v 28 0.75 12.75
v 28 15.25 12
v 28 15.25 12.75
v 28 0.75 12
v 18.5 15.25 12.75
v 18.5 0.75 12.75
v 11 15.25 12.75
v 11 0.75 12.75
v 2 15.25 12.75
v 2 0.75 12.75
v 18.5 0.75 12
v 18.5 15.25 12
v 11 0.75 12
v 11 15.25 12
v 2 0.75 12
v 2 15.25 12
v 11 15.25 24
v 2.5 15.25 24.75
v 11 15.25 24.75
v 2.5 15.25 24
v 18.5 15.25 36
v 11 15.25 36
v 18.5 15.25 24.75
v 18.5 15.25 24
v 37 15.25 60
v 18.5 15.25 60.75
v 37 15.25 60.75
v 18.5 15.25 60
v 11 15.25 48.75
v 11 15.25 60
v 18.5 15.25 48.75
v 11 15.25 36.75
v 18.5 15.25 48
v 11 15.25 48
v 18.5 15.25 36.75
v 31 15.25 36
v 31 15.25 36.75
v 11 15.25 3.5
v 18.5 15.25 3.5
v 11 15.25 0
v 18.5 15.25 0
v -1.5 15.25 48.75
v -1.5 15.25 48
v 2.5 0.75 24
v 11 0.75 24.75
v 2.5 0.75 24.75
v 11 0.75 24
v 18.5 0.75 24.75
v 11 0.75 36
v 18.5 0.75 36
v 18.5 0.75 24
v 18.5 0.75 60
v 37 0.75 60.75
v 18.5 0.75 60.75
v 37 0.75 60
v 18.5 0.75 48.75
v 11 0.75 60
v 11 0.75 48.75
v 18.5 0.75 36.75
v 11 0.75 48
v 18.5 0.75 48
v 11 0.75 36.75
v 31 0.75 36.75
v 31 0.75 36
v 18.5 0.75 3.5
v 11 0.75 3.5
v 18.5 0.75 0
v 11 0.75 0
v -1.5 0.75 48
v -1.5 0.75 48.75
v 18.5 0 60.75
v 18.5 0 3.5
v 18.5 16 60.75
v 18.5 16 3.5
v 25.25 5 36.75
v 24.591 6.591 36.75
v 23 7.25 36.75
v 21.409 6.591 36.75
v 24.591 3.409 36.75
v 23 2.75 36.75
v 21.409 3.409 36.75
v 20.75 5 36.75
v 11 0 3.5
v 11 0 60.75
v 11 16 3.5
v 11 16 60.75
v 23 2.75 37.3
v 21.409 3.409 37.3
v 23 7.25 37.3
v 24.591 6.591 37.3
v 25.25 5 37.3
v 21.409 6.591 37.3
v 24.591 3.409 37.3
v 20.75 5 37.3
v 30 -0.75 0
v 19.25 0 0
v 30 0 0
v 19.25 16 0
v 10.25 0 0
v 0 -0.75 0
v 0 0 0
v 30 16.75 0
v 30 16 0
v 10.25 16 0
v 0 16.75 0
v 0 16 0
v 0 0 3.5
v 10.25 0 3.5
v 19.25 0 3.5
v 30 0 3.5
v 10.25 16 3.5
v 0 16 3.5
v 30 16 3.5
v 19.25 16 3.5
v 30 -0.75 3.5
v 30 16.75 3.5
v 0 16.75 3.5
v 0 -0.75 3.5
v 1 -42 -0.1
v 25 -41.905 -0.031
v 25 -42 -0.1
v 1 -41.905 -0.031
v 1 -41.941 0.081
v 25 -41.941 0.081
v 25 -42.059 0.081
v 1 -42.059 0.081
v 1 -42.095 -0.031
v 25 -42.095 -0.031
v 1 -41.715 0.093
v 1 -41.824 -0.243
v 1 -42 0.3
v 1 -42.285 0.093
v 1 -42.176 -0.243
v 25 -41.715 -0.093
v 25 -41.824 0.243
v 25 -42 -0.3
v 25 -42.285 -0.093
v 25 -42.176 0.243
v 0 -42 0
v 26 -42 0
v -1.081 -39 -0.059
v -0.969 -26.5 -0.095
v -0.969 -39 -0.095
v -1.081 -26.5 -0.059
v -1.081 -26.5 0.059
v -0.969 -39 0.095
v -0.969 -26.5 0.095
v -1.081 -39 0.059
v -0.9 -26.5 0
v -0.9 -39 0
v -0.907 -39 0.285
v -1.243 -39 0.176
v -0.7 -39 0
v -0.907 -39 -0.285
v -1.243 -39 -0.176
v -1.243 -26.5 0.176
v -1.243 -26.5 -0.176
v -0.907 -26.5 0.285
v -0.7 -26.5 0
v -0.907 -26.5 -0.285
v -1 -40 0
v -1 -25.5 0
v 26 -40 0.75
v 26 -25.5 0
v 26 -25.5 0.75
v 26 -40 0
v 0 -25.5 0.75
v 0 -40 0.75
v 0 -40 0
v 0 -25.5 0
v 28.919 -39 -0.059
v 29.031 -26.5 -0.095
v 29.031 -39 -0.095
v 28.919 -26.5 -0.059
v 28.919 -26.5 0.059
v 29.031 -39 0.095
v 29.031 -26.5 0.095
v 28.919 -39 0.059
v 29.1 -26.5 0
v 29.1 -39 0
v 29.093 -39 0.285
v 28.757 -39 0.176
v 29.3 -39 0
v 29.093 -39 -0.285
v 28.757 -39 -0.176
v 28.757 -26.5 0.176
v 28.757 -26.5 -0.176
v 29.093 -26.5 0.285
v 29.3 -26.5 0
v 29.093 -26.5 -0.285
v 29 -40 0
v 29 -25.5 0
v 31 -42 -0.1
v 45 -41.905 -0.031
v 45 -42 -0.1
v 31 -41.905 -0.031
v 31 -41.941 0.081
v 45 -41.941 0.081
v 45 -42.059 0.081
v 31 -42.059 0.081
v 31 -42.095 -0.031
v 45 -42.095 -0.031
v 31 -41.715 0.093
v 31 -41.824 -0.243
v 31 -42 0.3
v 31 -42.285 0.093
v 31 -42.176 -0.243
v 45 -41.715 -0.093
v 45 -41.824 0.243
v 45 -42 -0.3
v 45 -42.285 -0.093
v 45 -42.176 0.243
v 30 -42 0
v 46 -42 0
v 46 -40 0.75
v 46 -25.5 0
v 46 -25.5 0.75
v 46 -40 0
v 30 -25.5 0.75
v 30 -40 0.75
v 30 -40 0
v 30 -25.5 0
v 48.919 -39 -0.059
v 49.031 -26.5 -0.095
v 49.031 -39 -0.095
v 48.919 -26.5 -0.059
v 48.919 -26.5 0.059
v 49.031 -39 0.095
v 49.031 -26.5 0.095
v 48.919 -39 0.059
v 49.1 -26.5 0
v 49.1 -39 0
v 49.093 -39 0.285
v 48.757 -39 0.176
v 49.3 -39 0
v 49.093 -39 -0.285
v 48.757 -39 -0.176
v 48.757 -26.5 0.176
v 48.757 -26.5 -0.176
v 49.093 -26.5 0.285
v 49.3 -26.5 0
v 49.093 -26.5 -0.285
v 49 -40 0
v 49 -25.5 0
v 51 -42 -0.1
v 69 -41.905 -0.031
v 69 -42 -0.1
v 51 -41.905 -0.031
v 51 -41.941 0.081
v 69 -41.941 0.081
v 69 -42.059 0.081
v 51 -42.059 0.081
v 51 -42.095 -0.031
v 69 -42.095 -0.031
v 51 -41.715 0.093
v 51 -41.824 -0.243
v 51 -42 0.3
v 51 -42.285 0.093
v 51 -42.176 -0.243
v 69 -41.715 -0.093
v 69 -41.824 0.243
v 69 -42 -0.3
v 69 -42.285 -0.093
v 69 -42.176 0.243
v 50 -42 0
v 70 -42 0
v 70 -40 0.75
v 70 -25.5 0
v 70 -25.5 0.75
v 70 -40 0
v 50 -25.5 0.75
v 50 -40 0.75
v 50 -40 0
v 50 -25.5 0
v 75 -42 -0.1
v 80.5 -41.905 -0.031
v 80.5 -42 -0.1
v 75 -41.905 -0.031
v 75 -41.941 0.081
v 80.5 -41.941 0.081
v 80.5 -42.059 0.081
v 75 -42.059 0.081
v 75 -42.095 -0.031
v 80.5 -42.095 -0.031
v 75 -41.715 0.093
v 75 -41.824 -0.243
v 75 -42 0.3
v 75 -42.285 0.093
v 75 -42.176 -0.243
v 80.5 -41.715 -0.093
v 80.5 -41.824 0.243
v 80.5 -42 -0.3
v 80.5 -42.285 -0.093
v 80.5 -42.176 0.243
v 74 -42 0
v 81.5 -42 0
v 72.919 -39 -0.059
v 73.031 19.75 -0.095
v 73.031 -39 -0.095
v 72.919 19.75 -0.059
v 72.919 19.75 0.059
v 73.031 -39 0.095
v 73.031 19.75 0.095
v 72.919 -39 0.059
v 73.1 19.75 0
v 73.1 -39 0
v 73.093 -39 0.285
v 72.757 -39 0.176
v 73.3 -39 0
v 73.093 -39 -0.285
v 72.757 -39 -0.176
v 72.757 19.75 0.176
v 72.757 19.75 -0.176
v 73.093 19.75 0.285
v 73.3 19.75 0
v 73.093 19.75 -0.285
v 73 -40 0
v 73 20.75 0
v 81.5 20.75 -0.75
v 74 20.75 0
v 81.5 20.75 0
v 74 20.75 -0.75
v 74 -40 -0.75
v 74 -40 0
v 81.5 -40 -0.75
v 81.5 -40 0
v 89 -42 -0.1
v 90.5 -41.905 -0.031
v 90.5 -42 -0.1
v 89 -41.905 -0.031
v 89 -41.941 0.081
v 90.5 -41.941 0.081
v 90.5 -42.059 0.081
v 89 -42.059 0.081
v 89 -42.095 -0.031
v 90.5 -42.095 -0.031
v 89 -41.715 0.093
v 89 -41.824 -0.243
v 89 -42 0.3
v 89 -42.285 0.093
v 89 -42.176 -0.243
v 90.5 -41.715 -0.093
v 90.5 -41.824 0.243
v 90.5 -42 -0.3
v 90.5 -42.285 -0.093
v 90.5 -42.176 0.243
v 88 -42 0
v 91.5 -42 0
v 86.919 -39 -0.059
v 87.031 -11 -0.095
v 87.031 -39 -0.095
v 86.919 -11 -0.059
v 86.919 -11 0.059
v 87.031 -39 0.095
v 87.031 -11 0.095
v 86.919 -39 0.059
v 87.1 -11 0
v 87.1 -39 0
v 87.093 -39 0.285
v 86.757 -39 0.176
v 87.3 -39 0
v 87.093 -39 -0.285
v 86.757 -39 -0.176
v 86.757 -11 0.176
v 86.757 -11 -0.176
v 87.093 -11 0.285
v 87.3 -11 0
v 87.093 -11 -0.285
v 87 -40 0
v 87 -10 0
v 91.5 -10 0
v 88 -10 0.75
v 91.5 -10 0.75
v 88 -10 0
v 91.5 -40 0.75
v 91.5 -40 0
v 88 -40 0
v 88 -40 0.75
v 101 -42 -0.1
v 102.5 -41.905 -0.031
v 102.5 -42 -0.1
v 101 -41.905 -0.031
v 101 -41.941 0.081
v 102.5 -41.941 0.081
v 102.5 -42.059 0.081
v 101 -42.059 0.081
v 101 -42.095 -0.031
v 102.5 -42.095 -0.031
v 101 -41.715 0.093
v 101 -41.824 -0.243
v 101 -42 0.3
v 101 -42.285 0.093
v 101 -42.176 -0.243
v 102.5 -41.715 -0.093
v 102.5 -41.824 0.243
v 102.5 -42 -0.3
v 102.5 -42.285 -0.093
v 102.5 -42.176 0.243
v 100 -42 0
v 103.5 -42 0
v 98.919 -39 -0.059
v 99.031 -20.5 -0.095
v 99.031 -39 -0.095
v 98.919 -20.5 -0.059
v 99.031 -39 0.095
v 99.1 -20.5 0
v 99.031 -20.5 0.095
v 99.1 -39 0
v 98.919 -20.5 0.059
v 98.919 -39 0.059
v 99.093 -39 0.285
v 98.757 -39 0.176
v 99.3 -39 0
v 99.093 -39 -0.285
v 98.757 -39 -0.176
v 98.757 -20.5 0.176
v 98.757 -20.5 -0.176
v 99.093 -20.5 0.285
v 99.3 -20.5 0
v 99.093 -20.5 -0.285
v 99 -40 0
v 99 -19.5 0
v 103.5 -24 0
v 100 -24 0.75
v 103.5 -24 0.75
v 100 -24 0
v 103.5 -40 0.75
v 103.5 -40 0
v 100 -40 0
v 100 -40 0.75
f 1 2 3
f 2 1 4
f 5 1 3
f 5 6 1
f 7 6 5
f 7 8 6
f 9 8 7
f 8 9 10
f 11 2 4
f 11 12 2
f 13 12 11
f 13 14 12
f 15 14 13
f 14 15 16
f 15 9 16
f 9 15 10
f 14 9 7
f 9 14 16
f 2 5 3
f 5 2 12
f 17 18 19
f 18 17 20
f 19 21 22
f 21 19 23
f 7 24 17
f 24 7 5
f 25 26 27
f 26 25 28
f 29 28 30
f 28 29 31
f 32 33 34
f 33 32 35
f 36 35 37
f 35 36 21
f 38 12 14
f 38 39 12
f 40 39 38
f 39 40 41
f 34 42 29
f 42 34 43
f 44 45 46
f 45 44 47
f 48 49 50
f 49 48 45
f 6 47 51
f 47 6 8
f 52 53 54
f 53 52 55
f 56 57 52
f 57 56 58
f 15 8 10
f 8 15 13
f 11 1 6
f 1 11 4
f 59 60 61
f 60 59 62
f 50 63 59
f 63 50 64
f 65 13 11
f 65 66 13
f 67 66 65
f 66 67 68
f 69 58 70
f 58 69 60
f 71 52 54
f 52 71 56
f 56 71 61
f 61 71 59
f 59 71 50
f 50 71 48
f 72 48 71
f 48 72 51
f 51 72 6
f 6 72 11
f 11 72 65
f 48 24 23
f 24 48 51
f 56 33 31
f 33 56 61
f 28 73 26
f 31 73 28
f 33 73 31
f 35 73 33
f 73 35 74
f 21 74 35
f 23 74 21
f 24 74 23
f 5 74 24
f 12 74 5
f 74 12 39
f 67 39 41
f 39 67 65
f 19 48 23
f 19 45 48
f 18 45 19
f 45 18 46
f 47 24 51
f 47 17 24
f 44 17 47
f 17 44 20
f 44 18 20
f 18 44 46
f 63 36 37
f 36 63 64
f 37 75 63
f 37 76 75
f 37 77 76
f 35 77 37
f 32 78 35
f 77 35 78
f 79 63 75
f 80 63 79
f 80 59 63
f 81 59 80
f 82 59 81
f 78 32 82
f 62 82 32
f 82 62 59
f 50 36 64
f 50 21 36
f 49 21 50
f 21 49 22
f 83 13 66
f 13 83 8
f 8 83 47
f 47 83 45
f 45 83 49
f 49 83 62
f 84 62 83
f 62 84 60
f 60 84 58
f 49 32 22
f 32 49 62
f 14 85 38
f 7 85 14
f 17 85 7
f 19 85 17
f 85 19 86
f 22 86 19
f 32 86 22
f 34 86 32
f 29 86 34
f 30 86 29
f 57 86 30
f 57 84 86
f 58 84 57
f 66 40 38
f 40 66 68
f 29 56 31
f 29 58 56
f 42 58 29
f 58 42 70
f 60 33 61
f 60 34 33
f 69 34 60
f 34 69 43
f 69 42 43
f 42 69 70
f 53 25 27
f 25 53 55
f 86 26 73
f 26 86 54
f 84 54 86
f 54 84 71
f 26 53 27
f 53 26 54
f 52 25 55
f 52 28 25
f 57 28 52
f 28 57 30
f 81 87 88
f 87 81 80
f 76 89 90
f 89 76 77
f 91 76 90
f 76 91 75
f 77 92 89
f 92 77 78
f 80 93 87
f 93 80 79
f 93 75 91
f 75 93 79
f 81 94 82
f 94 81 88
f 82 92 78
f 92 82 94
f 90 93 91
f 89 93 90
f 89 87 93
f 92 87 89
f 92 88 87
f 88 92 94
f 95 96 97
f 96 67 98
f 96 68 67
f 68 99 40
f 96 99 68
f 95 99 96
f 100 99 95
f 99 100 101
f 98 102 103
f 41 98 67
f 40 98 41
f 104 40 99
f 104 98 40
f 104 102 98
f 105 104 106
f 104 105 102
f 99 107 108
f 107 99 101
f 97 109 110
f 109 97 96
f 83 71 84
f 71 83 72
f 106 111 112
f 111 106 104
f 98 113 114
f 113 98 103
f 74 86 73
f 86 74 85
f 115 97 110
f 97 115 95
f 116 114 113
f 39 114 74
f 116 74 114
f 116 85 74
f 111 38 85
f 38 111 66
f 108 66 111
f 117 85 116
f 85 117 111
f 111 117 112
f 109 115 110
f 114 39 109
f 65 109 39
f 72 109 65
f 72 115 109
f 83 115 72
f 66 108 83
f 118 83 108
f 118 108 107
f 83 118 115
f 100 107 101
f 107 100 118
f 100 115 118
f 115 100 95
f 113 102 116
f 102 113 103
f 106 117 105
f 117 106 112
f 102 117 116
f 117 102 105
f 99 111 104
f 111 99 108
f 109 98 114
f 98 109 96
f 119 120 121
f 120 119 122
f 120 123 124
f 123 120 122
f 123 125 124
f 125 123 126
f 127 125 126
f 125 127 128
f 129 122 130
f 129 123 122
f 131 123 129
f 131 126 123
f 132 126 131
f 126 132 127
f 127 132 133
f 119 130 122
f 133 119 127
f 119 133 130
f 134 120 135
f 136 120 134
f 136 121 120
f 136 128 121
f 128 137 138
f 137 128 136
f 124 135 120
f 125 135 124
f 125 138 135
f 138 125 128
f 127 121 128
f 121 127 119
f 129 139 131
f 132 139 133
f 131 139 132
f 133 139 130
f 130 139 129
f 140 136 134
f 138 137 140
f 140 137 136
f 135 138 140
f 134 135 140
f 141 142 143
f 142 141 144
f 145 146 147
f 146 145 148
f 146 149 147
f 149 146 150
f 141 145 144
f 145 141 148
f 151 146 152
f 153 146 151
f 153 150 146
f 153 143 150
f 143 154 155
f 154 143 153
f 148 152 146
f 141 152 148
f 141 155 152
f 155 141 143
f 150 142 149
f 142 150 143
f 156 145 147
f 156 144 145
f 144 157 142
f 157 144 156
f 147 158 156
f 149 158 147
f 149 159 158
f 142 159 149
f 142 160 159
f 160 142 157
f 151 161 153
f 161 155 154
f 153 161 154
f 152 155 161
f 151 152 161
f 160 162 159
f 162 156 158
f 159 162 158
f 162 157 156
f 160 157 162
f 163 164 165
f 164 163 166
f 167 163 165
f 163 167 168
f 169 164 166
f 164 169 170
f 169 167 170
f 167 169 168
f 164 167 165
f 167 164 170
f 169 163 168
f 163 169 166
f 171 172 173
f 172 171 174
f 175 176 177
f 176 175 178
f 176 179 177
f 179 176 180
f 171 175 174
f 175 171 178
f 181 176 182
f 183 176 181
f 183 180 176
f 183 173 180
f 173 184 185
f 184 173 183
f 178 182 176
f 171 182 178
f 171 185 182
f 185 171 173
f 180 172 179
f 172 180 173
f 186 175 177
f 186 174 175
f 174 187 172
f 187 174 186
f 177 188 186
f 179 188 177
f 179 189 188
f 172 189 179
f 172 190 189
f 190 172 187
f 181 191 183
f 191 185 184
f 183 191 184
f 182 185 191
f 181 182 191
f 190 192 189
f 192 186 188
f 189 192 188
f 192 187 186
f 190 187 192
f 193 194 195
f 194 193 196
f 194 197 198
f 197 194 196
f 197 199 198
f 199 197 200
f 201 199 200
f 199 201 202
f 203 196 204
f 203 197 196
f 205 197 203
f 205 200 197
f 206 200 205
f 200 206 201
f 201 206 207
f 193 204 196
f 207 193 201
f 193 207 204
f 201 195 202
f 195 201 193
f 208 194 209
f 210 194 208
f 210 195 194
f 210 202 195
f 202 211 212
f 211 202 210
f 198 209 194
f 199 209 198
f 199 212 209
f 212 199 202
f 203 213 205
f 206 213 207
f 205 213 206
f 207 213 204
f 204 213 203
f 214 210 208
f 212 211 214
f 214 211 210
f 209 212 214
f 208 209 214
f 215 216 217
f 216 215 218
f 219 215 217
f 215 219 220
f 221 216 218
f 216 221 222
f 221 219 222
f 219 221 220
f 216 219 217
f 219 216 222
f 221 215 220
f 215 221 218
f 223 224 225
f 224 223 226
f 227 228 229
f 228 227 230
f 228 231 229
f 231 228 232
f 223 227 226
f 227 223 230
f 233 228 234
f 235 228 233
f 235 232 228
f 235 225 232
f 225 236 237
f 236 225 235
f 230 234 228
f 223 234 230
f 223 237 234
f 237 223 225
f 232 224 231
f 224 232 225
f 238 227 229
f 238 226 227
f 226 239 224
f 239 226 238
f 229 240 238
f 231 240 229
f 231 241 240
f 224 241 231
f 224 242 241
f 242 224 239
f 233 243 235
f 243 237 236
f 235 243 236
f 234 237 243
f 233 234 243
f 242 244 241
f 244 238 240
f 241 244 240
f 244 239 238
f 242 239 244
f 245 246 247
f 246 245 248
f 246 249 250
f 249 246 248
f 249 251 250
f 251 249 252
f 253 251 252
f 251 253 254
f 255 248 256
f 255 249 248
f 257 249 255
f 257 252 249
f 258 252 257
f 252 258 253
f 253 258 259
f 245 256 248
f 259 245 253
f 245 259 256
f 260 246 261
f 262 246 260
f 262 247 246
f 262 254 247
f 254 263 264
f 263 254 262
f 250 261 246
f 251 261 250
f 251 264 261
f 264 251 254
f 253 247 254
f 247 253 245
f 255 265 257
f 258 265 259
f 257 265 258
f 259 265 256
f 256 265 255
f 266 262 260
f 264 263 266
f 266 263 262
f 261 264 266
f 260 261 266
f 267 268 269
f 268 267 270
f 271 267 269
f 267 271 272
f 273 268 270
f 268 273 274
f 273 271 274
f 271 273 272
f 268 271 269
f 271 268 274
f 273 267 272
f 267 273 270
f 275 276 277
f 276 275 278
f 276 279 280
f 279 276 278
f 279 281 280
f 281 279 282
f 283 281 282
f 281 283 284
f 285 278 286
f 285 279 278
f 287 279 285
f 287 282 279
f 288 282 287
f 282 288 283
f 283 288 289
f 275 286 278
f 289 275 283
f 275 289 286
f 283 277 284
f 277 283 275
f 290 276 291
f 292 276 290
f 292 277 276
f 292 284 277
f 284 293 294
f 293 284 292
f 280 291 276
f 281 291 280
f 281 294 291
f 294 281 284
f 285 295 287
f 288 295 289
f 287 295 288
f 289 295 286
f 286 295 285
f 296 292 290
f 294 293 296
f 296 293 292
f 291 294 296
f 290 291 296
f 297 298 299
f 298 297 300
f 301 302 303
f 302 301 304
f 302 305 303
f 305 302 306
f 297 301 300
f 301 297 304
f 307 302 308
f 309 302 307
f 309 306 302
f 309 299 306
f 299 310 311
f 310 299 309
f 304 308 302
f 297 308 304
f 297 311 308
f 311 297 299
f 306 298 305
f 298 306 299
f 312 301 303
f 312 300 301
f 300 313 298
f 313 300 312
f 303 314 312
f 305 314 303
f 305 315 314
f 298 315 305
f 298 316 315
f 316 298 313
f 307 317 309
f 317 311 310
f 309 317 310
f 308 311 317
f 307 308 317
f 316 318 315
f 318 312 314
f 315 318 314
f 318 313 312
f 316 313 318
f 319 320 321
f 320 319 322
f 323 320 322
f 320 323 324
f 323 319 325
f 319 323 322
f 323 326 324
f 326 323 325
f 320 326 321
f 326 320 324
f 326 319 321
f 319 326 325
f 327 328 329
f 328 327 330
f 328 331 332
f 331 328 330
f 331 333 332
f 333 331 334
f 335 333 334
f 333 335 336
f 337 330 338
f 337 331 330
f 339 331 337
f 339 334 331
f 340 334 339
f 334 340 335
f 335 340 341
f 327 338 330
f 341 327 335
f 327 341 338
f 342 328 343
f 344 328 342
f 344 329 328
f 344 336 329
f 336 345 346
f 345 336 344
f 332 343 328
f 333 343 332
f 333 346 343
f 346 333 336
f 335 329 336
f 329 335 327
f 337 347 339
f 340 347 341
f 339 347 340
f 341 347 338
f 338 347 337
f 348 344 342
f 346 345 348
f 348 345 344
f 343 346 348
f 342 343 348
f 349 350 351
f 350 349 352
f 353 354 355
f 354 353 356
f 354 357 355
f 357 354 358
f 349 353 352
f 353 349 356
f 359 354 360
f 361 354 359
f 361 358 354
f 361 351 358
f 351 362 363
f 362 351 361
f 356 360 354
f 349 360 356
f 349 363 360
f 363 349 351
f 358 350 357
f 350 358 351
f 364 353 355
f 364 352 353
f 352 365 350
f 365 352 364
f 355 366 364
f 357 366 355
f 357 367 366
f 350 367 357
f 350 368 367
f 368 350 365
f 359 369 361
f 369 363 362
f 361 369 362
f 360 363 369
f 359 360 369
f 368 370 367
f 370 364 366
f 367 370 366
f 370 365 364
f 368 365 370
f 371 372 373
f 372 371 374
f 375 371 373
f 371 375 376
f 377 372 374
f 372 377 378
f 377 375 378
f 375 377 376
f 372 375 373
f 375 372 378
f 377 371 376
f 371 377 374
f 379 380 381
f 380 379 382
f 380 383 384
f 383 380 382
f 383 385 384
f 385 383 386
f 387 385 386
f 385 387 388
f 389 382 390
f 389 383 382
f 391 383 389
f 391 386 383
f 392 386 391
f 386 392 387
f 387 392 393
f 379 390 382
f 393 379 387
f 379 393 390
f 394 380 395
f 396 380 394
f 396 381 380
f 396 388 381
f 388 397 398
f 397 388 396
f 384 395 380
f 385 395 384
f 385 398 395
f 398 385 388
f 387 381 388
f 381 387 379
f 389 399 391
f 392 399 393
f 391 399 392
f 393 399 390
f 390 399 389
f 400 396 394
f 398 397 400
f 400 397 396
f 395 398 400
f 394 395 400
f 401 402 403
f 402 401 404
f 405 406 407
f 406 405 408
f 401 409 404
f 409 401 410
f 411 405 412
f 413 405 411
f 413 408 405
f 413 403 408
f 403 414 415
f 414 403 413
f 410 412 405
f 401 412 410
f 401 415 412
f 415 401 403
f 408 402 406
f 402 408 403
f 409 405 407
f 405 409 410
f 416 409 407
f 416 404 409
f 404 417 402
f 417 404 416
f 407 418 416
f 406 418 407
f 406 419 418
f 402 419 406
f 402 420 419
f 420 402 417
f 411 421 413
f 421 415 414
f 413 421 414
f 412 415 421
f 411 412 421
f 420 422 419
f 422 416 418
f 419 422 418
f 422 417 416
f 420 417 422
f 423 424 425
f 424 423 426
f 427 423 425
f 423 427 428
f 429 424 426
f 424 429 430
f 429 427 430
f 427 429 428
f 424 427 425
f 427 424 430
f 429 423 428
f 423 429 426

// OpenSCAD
// file: ../lib/common.scad
//--------------------------------------------------------------------------------------------------
// Module Prism
//--------------------------------------------------------------------------------------------------
module prism(z, y, x)
{
    rotate([0, 90, 0])
    {
        polyhedron(
                points=[[0,0,0], [x,0,0], [x,y,0], [0,y,0], [0,y,z], [x,y,z]],
                faces=[[0,1,2,3],[5,4,3,2],[0,4,5,1],[0,3,4],[5,2,1]]);
    }
    
}

//--------------------------------------------------------------------------------------------------
// Module Side panel
//--------------------------------------------------------------------------------------------------
module rect_cut(x, y, z, dx, dy)
{
    // Top panel
    translate([0, dy, 0])
    {
        cube([x, y - dy, z]);
    };

    // Left bottom panel
    translate([0, 0, 0])
    {
        cube([dx, dy, z]);
    };

    // Triangle
    translate([dx, 0, 0])
    {
        rotate([0, 0, 0])
        {
            prism(x - dx, dy, -z);
        }
    };
}

//--------------------------------------------------------------------------------------------------
// X dimensional arrow
//--------------------------------------------------------------------------------------------------
module arrow_x(l)
{
    line_w = 0.1;
    arrow_w = 1;
    arrow_h = 0.3;

    // Line
    translate([l / 2, 0, 0])
    {
        rotate([0, 90, 0])
        {
            color([0.4, 0.4, 0.4])
            cylinder(l - arrow_w * 2, line_w, line_w, true);
        }
    }

    // Left arrow
    translate([arrow_w, 0, 0])
    {
        rotate([0, 270, 0])
        {
            color([0.4, 0.4, 0.4])
            cylinder(arrow_w, arrow_h, 0, false);
        }
    }

    // Right arrow
    translate([l - arrow_w, 0, 0])
    {
        rotate([0, 90, 0])
        {
            color([0.4, 0.4, 0.4])
            cylinder(arrow_w, arrow_h, 0, false);
        }
    }

    // Text
    translate([l/3, 0.5, 0])
    {
        color([0.4, 0.4, 0.4])
        text(str(l), size=1);
    }
}

//--------------------------------------------------------------------------------------------------
// Y dimensional arrow
//--------------------------------------------------------------------------------------------------
module arrow_y(l)
{
    line_w = 0.1;
    arrow_w = 1;
    arrow_h = 0.3;

    // Line
    translate([0, l / 2, 0])
    {
        rotate([90, 0, 00])
        {
            color([0.4, 0.4, 0.4])
            cylinder(l - arrow_w * 2, line_w, line_w, true);
        }
    }

    // Left arrow
    translate([0 ,arrow_w, 0])
    {
        rotate([90, 0, 0])
        {
            color([0.4, 0.4, 0.4])
            cylinder(arrow_w, arrow_h, 0, false);
        }
    }

    // Right arrow
    translate([0, l - arrow_w, 0])
    {
        rotate([270, 0, 0])
        {
            color([0.4, 0.4, 0.4])
            cylinder(arrow_w, arrow_h, 0, false);
        }
    }

    // Text
    translate([-0.5, l/3, 0])
    {
        rotate([0 ,0, 90])
        {
            color([0.4, 0.4, 0.4])
            text(str(l), size=1);
        }
    }
}

//--------------------------------------------------------------------------------------------------
// Z dimensional arrow
//--------------------------------------------------------------------------------------------------
module arrow_z(l)
{
    line_w = 0.1;
    arrow_w = 1;
    arrow_h = 0.3;

    // Line
    translate([0, 0, l / 2])
    {
        rotate([0, 0, 0])
        {
            color([0.4, 0.4, 0.4])
            cylinder(l - arrow_w * 2, line_w, line_w, true);
        }
    }

    // Left arrow
    translate([0, 0, arrow_w])
    {
        rotate([0, 180, 0])
        {
            color([0.4, 0.4, 0.4])
            cylinder(arrow_w, arrow_h, 0, false);
        }
    }

    // Right arrow
    translate([0, 0, l - arrow_w])
    {
        rotate([0, 0, 0])
        {
            color([0.4, 0.4, 0.4])
            cylinder(arrow_w, arrow_h, 0, false);
        }
    }

    // Text
    translate([0.5, 0, l/3])
    {
        rotate([90 ,0, 90])
        {
            color([0.4, 0.4, 0.4])
            text(str(l), size=1);
        }
    }
}

//--------------------------------------------------------------------------------------------------
// parallelogram
//--------------------------------------------------------------------------------------------------
module parallelogram(x = 12, y = 12, z = 1, xd = 0)
{
    points = [
        [0, 0, 0 ],        //0
        [x, 0, 0 ],        //1
        [x + xd, y, 0],    //2
        [xd, y, 0 ],       //3
        [0, 0, z ],        //4
        [x, 0, z ],        //5
        [x + xd, y, z ],   //6
        [xd, y, z ]];      //7

    faces = [
        [0,1,2,3],         // bottom
        [4,5,1,0],         // front
        [7,6,5,4],         // top
        [5,6,2,1],         // right
        [6,7,3,2],         // back
        [7,4,0,3]];        // left

    polyhedron(points, faces);
}
// main file
include <../lib/common.scad>


//--------------------------------------------------------------------------------------------------
module board0()
{
    color([0, 1, 0])
    cube([26, 14.5, 0.75]);
}

//--------------------------------------------------------------------------------------------------
module board1()
{
    color([0.5, 0.5, 0])
    cube([16, 14.5, 0.75]);
}

//--------------------------------------------------------------------------------------------------
module board2()
{
    color([0.8, 0.5, 0])
    cube([20, 14.5, 0.75]);
}

//--------------------------------------------------------------------------------------------------
module stud()
{
    color([1, 0, 0])
    cube([7.5, 0.75, 60.75]);
}

//--------------------------------------------------------------------------------------------------
module base()
{
    color([0, 0, 1])
    cube([30, 0.75, 3.5]);
}

//--------------------------------------------------------------------------------------------------
module base_bar()
{
    color([0, 1, 1])
    cube([16, 0.75, 3.5]);
}

//--------------------------------------------------------------------------------------------------
module bowl()
{
    color([0.8, 0.8, 0.2])
    cylinder(1, 2.25, 2.25, false);
}

//--------------------------------------------------------------------------------------------------
// Render
//--------------------------------------------------------------------------------------------------
translate([0, 0, 0])
{
    translate([11, 0, 0])
    {
        //----------------------------------------------------------------------------------------------
        // level 1
        //----------------------------------------------------------------------------------------------
        translate([-9, 0.75, 12])
        {
            board0();
        }

        //----------------------------------------------------------------------------------------------
        // level 2
        //----------------------------------------------------------------------------------------------
        translate([-8.5, 0.75, 24])
        {
            board1();
        }

        //----------------------------------------------------------------------------------------------
        // level 3
        //----------------------------------------------------------------------------------------------
        translate([0, 0.75, 36])
        {
            board2();
        }

        //----------------------------------------------------------------------------------------------
        // level 4
        //----------------------------------------------------------------------------------------------
        translate([-12.5, 0.75, 48])
        {
            board2();
        }

        //----------------------------------------------------------------------------------------------
        // level 5
        //----------------------------------------------------------------------------------------------
        translate([0, 0.75, 60])
        {
            board0();
        }

        //----------------------------------------------------------------------------------------------
        // bowl
        //----------------------------------------------------------------------------------------------
        translate([12, 5, 36.3])
        {
            bowl();
        }

        //----------------------------------------------------------------------------------------------
        // stud 0
        //----------------------------------------------------------------------------------------------
        translate([0, 0, 0])
        {
            rotate([0, 0, 0])
            {
                stud();
            }
        }

        //----------------------------------------------------------------------------------------------
        // stud 1
        //----------------------------------------------------------------------------------------------
        translate([0, 15.25, 0])
        {
            rotate([0, 0, 0])
            {
                stud();
            }
        }
    }

    //----------------------------------------------------------------------------------------------
    // base 0
    //----------------------------------------------------------------------------------------------
    translate([0, -0.75, 0])
    {
        rotate([0, 0, 0])
        {
            base();
        }
    }

    //----------------------------------------------------------------------------------------------
    // base 1
    //----------------------------------------------------------------------------------------------
    translate([0, 16, 0])
    {
        rotate([0, 0, 0])
        {
            base();
        }
    }

    //----------------------------------------------------------------------------------------------
    // base bar 0
    //----------------------------------------------------------------------------------------------
    translate([11, 0, 0])
    {
        rotate([0, 0, 90])
        {
            base_bar();
        }
    }

    //----------------------------------------------------------------------------------------------
    // base bar 1
    //----------------------------------------------------------------------------------------------
    translate([19.25, 0, 0])
    {
        rotate([0, 0, 90])
        {
            base_bar();
        }
    }
}

//--------------------------------------------------------------------------------------------------
// Draw Parts
//--------------------------------------------------------------------------------------------------
translate([0, -40, 0])
{
    //----------------------------------------------------------------------------------------------
    // board0
    translate([0, 0, 0])
    {
        board0();

        translate([0, -2, 0])
        {
            arrow_x(26);
        };

        translate([-1, 0, 0])
        {
            arrow_y(14.5);
        };
    };

    //----------------------------------------------------------------------------------------------
    // board1
    translate([30, 0, 0])
    {
        board1();

        translate([0, -2, 0])
        {
            arrow_x(16);
        };

        translate([-1, 0, 0])
        {
            arrow_y(14.5);
        };
    };

    //----------------------------------------------------------------------------------------------
    // board2
    translate([50, 0, 0])
    {
        board2();

        translate([0, -2, 0])
        {
            arrow_x(20);
        };

        translate([-1, 0, 0])
        {
            arrow_y(14.5);
        };
    };

    //----------------------------------------------------------------------------------------------
    // stud
    translate([74, 0, 0])
    {
        rotate([270, 0, 0])
        {
            stud();
        }

        translate([0, -2, 0])
        {
            arrow_x(7.5);
        };

        translate([-1, 0, 0])
        {
            arrow_y(60.75);
        };
    };

    //----------------------------------------------------------------------------------------------
    // base
    translate([88, 0, 0])
    {
        rotate([90, 0, 90])
        {
            base();
        }

        translate([0, -2, 0])
        {
            arrow_x(3.5);
        };

        translate([-1, 0, 0])
        {
            arrow_y(30);
        };
    };

    //----------------------------------------------------------------------------------------------
    // base bar
    translate([100, 0, 0])
    {
        rotate([90, 0, 90])
        {
            base_bar();
        }

        translate([0, -2, 0])
        {
            arrow_x(3.5);
        };

        translate([-1, 0, 0])
        {
            arrow_y(20.5);
        };
    };
}
